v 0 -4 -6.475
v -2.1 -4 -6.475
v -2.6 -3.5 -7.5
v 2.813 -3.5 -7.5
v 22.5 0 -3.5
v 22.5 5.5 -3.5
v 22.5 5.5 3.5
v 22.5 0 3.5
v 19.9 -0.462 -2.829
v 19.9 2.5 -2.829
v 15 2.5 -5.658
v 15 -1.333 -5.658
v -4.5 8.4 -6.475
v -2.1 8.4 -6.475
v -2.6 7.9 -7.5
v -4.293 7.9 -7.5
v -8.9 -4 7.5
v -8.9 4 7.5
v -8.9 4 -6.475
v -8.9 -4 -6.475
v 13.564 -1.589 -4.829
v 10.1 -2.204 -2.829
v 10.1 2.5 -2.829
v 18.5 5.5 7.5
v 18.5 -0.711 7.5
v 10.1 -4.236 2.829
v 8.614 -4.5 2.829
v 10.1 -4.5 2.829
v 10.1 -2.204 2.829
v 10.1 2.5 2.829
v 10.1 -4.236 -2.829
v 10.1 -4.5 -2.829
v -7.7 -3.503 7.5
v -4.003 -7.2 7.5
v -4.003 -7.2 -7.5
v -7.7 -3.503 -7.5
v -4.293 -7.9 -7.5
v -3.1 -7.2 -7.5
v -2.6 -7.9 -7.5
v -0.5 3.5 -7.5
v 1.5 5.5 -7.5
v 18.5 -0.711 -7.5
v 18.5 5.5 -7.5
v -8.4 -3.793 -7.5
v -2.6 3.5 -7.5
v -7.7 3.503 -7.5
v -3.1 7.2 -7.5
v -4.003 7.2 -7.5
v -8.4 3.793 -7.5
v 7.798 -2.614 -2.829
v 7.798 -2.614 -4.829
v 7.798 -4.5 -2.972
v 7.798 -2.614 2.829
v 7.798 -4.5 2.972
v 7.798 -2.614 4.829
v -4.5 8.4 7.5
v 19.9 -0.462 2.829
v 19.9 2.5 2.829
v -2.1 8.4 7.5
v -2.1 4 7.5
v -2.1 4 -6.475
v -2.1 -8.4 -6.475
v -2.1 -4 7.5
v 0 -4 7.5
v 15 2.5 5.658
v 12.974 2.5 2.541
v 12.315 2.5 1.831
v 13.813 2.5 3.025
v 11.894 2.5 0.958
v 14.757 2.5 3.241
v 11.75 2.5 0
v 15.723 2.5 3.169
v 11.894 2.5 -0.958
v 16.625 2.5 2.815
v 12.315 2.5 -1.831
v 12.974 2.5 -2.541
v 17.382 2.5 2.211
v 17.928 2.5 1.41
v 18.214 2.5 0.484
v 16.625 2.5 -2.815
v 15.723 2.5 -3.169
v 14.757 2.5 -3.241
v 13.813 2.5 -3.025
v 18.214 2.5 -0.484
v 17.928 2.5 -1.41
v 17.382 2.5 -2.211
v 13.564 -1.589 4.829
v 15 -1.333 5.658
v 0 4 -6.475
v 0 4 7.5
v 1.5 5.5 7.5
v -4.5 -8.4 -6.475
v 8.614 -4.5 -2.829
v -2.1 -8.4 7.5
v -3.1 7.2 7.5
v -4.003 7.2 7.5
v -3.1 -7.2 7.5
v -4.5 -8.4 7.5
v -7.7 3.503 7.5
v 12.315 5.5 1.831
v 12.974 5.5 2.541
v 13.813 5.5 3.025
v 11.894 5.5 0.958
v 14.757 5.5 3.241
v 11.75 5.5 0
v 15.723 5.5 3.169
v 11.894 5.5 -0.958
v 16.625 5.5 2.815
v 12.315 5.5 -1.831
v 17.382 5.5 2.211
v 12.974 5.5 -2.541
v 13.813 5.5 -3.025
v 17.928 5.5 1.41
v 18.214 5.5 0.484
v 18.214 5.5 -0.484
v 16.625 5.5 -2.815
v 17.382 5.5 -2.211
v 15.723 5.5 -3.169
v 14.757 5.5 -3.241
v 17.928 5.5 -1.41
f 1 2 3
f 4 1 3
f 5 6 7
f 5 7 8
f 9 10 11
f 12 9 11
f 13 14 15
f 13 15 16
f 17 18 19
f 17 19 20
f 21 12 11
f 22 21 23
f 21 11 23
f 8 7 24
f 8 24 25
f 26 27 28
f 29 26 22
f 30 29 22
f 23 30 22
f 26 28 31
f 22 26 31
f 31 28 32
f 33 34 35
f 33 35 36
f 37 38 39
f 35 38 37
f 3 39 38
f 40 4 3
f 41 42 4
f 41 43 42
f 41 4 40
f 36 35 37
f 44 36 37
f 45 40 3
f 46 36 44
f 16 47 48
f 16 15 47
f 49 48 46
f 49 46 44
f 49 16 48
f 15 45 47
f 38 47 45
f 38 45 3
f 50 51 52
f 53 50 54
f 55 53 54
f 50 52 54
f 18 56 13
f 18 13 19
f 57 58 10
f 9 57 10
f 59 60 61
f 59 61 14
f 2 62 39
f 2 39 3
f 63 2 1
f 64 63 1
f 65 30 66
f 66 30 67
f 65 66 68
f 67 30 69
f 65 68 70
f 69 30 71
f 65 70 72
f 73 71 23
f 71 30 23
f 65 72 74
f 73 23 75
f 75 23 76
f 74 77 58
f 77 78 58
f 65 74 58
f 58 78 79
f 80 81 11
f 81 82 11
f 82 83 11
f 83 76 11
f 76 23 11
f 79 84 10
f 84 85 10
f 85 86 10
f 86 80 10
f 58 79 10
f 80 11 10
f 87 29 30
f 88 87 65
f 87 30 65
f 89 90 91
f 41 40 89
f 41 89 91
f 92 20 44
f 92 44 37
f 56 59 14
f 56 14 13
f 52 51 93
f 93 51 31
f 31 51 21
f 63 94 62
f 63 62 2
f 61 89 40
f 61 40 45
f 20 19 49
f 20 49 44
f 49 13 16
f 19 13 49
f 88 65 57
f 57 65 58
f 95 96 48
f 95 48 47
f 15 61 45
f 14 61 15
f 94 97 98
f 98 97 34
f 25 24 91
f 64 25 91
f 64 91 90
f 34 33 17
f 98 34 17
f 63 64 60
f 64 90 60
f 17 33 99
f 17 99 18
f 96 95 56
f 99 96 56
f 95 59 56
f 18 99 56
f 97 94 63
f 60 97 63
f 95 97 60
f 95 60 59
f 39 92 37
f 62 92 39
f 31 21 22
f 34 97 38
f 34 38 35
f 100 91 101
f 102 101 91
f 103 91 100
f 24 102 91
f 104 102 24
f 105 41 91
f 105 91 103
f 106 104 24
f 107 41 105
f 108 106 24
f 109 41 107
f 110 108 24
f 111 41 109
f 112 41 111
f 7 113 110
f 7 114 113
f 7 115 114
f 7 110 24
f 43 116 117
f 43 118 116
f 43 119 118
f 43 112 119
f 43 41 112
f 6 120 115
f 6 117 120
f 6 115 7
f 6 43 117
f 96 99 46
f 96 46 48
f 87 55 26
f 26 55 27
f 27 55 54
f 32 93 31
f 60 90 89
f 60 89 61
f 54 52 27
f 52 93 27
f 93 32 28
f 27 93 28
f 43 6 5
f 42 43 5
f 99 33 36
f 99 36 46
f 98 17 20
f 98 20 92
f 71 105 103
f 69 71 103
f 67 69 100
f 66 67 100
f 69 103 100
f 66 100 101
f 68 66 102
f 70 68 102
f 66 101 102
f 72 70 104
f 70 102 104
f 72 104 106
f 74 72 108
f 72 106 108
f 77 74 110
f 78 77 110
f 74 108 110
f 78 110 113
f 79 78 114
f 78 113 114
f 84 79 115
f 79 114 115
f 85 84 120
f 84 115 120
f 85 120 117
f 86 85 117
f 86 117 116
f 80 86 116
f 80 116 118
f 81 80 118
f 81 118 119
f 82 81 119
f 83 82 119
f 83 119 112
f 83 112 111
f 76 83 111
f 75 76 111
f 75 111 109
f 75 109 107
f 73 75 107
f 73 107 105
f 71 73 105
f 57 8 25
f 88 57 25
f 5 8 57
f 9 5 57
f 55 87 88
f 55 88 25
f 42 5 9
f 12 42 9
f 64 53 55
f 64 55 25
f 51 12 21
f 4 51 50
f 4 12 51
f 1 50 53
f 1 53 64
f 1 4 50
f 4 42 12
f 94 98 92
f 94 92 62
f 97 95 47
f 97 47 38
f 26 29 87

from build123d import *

# Parameters (mm, degrees)
SALIENTE_EXTRUIR1_DEPTH = 7.5
SALIENTE_EXTRUIR2_DEPTH = 15
CROQUIS7_R              = 3.25
CORTAR_EXTRUIR4_DEPTH   = 28.490180065
CORTAR_EXTRUIR5_START   = -3
CORTAR_EXTRUIR5_DEPTH   = 10
CROQUIS9_W              = 2.302374724
CROQUIS9_H              = 5.658032638
SALIENTE_EXTRUIR3_DEPTH = 7
CHAFL_N3_SIZE           = 2
CORTAR_EXTRUIR3_DEPTH   = 29.316249752
CHAFL_N4_SIZE           = 4
CHAFL_N2_SIZE           = 0.5
CHAFL_N2_SIZE2          = 1.025151921


with BuildPart() as part:
    # Croquis1 → Saliente-Extruir1 (new, symmetric)
    with BuildSketch(Plane.XY):
        Polygon((0, 4), (-2.1, 4), (-2.1, 8.4), (-4.5, 8.4), (-8.9, 4), (-8.9, -4), (-4.5, -8.4), (-2.1, -8.4), (-2.1, -4), (0, -4), align=None)
    extrude(amount=SALIENTE_EXTRUIR1_DEPTH, both=True)

    # Croquis6 → Saliente-Extruir2 (add, through all)
    with BuildSketch(Plane(origin=(0, 0, -7.5), x_dir=(-1, 0, 0), z_dir=(0, 0, -1))):
        Polygon((0, 4), (-1.5, 5.5), (-22.5, 5.5), (-22.5, 0), (0, -4), align=None)
    extrude(amount=-SALIENTE_EXTRUIR2_DEPTH)

    # Croquis7 → Cortar-Extruir4 (cut, through all)
    with BuildSketch(Plane(origin=(0, 5.5, 0), x_dir=(1, 0, 0), z_dir=(0, 1, 0))):
        with Locations(Location((15, 0, 0), (0, 0, 180))):
            Circle(CROQUIS7_R)
    extrude(amount=-CORTAR_EXTRUIR4_DEPTH, mode=Mode.SUBTRACT)

    # Croquis8 → Cortar-Extruir5 (cut)
    with BuildSketch(Plane(origin=(0, 5.5, 0), x_dir=(1, 0, 0), z_dir=(0, 1, 0)).offset(CORTAR_EXTRUIR5_START)):
        Polygon((15, 5.658032638), (10.1, 2.829016319), (10.1, -2.829016319), (15, -5.658032638), (19.9, -2.829016319), (19.9, 2.829016319), align=None)
    extrude(amount=-CORTAR_EXTRUIR5_DEPTH, mode=Mode.SUBTRACT)

    # Croquis9 → Saliente-Extruir3 (add)
    with BuildSketch(Plane.XZ.offset(-2.5)):
        with Locations((8.948812638, 0)):
            Rectangle(CROQUIS9_W, CROQUIS9_H)
    extrude(amount=SALIENTE_EXTRUIR3_DEPTH)

    # Chaflán3
    # the kernel refuses this chamfer: 2 mm, written as the material it adds along each edge
    with BuildSketch(Plane(origin=(2.733659972, -3.514016005, 2.829016319), x_dir=(-0.004812694974131689, 0.02707140922949076, 0.9996219169112968), z_dir=(0.9845625077859067, 0.1750333347174944, 0))) as chafl_n3_piece_1_section:
        Polygon((CHAFL_N3_SIZE * 0.999621916911, CHAFL_N3_SIZE * 0.0274958766106), (-CHAFL_N3_SIZE * 0.0274958766106, CHAFL_N3_SIZE * 0.999621916911), (0, 0), align=None)
    chafl_n3_piece_1 = extrude(amount=12.625206864, mode=Mode.PRIVATE)
    chafl_n3_piece_1 = split(chafl_n3_piece_1, bisect_by=Plane(origin=(9.52379564, -3.075112264, 2.496344577), z_dir=(-0.4999999999999998, 0, 0.8660254037844388)), keep=Keep.TOP, mode=Mode.PRIVATE)
    chafl_n3_piece_1 = split(chafl_n3_piece_1, bisect_by=Plane(origin=(7.797625276, -3.075112264, 3.490856258), z_dir=(1, 0, 0)), keep=Keep.TOP, mode=Mode.PRIVATE)
    chafl_n3_piece_1 = split(chafl_n3_piece_1, bisect_by=Plane(origin=(8.949614054, -4.5, 3.490856258), z_dir=(0, 1, 0)), keep=Keep.TOP, mode=Mode.PRIVATE)
    chafl_n3_piece_1 = split(chafl_n3_piece_1, bisect_by=Plane(origin=(10.1, -3.075112264, 3.490856258), z_dir=(-1, 0, 0)), keep=Keep.TOP, mode=Mode.PRIVATE)
    add(chafl_n3_piece_1)
    with BuildSketch(Plane(origin=(2.733659972, -3.514016005, 2.829016319), x_dir=(-0.004812694974131689, 0.02707140922949076, 0.9996219169112968), z_dir=(0.9845625077859067, 0.1750333347174944, 0))) as chafl_n3_piece_2_section:
        Polygon((CHAFL_N3_SIZE * 0.999621916911, CHAFL_N3_SIZE * 0.0274958766106), (-CHAFL_N3_SIZE * 0.0274958766106, CHAFL_N3_SIZE * 0.999621916911), (0, 0), align=None)
    chafl_n3_piece_2 = extrude(amount=12.625206864, mode=Mode.PRIVATE)
    chafl_n3_piece_2 = split(chafl_n3_piece_2, bisect_by=Plane(origin=(11.228614623, -2.50665574, 3.480622276), z_dir=(-0.4999999999999998, 0, 0.8660254037844388)), keep=Keep.TOP, mode=Mode.PRIVATE)
    chafl_n3_piece_2 = split(chafl_n3_piece_2, bisect_by=Plane(origin=(10.1, -2.50665574, 3.87158585), z_dir=(1, 0, 0)), keep=Keep.TOP, mode=Mode.PRIVATE)
    add(chafl_n3_piece_2)
    with BuildSketch(Plane(origin=(15.163965304, -1.304183946, -2.829016319), x_dir=(-0.004812694974131689, 0.02707140922949076, -0.9996219169112968), z_dir=(-0.9845625077859067, -0.1750333347174944, 0))) as chafl_n3_piece_3_section:
        Polygon((CHAFL_N3_SIZE * 0.999621916911, CHAFL_N3_SIZE * 0.0274958766106), (-CHAFL_N3_SIZE * 0.0274958766106, CHAFL_N3_SIZE * 0.999621916911), (0, 0), align=None)
    chafl_n3_piece_3 = extrude(amount=12.625206864, mode=Mode.PRIVATE)
    chafl_n3_piece_3 = split(chafl_n3_piece_3, bisect_by=Plane(origin=(11.228614623, -2.50665574, -3.480622276), z_dir=(-0.49999999999999994, 0, -0.8660254037844387)), keep=Keep.TOP, mode=Mode.PRIVATE)
    chafl_n3_piece_3 = split(chafl_n3_piece_3, bisect_by=Plane(origin=(10.1, -2.50665574, -3.87158585), z_dir=(1, 0, 0)), keep=Keep.TOP, mode=Mode.PRIVATE)
    add(chafl_n3_piece_3)
    with BuildSketch(Plane(origin=(15.163965304, -1.304183946, -2.829016319), x_dir=(-0.004812694974131689, 0.02707140922949076, -0.9996219169112968), z_dir=(-0.9845625077859067, -0.1750333347174944, 0))) as chafl_n3_piece_4_section:
        Polygon((CHAFL_N3_SIZE * 0.999621916911, CHAFL_N3_SIZE * 0.0274958766106), (-CHAFL_N3_SIZE * 0.0274958766106, CHAFL_N3_SIZE * 0.999621916911), (0, 0), align=None)
    chafl_n3_piece_4 = extrude(amount=12.625206864, mode=Mode.PRIVATE)
    chafl_n3_piece_4 = split(chafl_n3_piece_4, bisect_by=Plane(origin=(9.52379564, -3.075112264, -2.496344577), z_dir=(-0.49999999999999994, 0, -0.8660254037844387)), keep=Keep.TOP, mode=Mode.PRIVATE)
    chafl_n3_piece_4 = split(chafl_n3_piece_4, bisect_by=Plane(origin=(7.797625276, -3.075112264, -3.490856258), z_dir=(1, 0, 0)), keep=Keep.TOP, mode=Mode.PRIVATE)
    chafl_n3_piece_4 = split(chafl_n3_piece_4, bisect_by=Plane(origin=(10.1, -3.075112264, -3.490856258), z_dir=(-1, 0, 0)), keep=Keep.TOP, mode=Mode.PRIVATE)
    chafl_n3_piece_4 = split(chafl_n3_piece_4, bisect_by=Plane(origin=(8.949614054, -4.5, -3.490856258), z_dir=(0, 1, 0)), keep=Keep.TOP, mode=Mode.PRIVATE)
    add(chafl_n3_piece_4)

    # Croquis5 → Cortar-Extruir3 (cut, through all)
    with BuildSketch(Plane.XY.offset(7.5)):
        Polygon((-3.1, 7.2), (-3.1, -7.2), (-4.002943725, -7.2), (-7.7, -3.502943725), (-7.7, 3.502943725), (-4.002943725, 7.2), align=None)
    extrude(amount=-CORTAR_EXTRUIR3_DEPTH, mode=Mode.SUBTRACT)

    # Chaflán4
    chafl_n4_edges = [part.edges().sort_by_distance(p)[0] for p in [
        (22.5, 2.75, 7.5),
        (22.5, 2.75, -7.5),
    ]]
    chamfer(chafl_n4_edges, length=CHAFL_N4_SIZE)

    # Chaflán2
    chafl_n2_edges = [part.edges().sort_by_distance(p)[0] for p in [
        (-1.05, -4, -7.5),
        (-2.1, -6.2, -7.5),
        (-3.3, -8.4, -7.5),
        (-6.7, -6.2, -7.5),
        (-8.9, 0, -7.5),
        (-6.7, 6.2, -7.5),
        (-3.3, 8.4, -7.5),
        (-2.1, 6.2, -7.5),
        (-1.05, 4, -7.5),
    ]]
    chafl_n2_side = [part.faces().sort_by_distance(p)[0] for p in [
        (5.002983823, 1.055154991, -7.5),
    ]]
    chamfer(chafl_n2_edges, length=CHAFL_N2_SIZE, length2=CHAFL_N2_SIZE2, reference=chafl_n2_side[0])


solid = part.part
